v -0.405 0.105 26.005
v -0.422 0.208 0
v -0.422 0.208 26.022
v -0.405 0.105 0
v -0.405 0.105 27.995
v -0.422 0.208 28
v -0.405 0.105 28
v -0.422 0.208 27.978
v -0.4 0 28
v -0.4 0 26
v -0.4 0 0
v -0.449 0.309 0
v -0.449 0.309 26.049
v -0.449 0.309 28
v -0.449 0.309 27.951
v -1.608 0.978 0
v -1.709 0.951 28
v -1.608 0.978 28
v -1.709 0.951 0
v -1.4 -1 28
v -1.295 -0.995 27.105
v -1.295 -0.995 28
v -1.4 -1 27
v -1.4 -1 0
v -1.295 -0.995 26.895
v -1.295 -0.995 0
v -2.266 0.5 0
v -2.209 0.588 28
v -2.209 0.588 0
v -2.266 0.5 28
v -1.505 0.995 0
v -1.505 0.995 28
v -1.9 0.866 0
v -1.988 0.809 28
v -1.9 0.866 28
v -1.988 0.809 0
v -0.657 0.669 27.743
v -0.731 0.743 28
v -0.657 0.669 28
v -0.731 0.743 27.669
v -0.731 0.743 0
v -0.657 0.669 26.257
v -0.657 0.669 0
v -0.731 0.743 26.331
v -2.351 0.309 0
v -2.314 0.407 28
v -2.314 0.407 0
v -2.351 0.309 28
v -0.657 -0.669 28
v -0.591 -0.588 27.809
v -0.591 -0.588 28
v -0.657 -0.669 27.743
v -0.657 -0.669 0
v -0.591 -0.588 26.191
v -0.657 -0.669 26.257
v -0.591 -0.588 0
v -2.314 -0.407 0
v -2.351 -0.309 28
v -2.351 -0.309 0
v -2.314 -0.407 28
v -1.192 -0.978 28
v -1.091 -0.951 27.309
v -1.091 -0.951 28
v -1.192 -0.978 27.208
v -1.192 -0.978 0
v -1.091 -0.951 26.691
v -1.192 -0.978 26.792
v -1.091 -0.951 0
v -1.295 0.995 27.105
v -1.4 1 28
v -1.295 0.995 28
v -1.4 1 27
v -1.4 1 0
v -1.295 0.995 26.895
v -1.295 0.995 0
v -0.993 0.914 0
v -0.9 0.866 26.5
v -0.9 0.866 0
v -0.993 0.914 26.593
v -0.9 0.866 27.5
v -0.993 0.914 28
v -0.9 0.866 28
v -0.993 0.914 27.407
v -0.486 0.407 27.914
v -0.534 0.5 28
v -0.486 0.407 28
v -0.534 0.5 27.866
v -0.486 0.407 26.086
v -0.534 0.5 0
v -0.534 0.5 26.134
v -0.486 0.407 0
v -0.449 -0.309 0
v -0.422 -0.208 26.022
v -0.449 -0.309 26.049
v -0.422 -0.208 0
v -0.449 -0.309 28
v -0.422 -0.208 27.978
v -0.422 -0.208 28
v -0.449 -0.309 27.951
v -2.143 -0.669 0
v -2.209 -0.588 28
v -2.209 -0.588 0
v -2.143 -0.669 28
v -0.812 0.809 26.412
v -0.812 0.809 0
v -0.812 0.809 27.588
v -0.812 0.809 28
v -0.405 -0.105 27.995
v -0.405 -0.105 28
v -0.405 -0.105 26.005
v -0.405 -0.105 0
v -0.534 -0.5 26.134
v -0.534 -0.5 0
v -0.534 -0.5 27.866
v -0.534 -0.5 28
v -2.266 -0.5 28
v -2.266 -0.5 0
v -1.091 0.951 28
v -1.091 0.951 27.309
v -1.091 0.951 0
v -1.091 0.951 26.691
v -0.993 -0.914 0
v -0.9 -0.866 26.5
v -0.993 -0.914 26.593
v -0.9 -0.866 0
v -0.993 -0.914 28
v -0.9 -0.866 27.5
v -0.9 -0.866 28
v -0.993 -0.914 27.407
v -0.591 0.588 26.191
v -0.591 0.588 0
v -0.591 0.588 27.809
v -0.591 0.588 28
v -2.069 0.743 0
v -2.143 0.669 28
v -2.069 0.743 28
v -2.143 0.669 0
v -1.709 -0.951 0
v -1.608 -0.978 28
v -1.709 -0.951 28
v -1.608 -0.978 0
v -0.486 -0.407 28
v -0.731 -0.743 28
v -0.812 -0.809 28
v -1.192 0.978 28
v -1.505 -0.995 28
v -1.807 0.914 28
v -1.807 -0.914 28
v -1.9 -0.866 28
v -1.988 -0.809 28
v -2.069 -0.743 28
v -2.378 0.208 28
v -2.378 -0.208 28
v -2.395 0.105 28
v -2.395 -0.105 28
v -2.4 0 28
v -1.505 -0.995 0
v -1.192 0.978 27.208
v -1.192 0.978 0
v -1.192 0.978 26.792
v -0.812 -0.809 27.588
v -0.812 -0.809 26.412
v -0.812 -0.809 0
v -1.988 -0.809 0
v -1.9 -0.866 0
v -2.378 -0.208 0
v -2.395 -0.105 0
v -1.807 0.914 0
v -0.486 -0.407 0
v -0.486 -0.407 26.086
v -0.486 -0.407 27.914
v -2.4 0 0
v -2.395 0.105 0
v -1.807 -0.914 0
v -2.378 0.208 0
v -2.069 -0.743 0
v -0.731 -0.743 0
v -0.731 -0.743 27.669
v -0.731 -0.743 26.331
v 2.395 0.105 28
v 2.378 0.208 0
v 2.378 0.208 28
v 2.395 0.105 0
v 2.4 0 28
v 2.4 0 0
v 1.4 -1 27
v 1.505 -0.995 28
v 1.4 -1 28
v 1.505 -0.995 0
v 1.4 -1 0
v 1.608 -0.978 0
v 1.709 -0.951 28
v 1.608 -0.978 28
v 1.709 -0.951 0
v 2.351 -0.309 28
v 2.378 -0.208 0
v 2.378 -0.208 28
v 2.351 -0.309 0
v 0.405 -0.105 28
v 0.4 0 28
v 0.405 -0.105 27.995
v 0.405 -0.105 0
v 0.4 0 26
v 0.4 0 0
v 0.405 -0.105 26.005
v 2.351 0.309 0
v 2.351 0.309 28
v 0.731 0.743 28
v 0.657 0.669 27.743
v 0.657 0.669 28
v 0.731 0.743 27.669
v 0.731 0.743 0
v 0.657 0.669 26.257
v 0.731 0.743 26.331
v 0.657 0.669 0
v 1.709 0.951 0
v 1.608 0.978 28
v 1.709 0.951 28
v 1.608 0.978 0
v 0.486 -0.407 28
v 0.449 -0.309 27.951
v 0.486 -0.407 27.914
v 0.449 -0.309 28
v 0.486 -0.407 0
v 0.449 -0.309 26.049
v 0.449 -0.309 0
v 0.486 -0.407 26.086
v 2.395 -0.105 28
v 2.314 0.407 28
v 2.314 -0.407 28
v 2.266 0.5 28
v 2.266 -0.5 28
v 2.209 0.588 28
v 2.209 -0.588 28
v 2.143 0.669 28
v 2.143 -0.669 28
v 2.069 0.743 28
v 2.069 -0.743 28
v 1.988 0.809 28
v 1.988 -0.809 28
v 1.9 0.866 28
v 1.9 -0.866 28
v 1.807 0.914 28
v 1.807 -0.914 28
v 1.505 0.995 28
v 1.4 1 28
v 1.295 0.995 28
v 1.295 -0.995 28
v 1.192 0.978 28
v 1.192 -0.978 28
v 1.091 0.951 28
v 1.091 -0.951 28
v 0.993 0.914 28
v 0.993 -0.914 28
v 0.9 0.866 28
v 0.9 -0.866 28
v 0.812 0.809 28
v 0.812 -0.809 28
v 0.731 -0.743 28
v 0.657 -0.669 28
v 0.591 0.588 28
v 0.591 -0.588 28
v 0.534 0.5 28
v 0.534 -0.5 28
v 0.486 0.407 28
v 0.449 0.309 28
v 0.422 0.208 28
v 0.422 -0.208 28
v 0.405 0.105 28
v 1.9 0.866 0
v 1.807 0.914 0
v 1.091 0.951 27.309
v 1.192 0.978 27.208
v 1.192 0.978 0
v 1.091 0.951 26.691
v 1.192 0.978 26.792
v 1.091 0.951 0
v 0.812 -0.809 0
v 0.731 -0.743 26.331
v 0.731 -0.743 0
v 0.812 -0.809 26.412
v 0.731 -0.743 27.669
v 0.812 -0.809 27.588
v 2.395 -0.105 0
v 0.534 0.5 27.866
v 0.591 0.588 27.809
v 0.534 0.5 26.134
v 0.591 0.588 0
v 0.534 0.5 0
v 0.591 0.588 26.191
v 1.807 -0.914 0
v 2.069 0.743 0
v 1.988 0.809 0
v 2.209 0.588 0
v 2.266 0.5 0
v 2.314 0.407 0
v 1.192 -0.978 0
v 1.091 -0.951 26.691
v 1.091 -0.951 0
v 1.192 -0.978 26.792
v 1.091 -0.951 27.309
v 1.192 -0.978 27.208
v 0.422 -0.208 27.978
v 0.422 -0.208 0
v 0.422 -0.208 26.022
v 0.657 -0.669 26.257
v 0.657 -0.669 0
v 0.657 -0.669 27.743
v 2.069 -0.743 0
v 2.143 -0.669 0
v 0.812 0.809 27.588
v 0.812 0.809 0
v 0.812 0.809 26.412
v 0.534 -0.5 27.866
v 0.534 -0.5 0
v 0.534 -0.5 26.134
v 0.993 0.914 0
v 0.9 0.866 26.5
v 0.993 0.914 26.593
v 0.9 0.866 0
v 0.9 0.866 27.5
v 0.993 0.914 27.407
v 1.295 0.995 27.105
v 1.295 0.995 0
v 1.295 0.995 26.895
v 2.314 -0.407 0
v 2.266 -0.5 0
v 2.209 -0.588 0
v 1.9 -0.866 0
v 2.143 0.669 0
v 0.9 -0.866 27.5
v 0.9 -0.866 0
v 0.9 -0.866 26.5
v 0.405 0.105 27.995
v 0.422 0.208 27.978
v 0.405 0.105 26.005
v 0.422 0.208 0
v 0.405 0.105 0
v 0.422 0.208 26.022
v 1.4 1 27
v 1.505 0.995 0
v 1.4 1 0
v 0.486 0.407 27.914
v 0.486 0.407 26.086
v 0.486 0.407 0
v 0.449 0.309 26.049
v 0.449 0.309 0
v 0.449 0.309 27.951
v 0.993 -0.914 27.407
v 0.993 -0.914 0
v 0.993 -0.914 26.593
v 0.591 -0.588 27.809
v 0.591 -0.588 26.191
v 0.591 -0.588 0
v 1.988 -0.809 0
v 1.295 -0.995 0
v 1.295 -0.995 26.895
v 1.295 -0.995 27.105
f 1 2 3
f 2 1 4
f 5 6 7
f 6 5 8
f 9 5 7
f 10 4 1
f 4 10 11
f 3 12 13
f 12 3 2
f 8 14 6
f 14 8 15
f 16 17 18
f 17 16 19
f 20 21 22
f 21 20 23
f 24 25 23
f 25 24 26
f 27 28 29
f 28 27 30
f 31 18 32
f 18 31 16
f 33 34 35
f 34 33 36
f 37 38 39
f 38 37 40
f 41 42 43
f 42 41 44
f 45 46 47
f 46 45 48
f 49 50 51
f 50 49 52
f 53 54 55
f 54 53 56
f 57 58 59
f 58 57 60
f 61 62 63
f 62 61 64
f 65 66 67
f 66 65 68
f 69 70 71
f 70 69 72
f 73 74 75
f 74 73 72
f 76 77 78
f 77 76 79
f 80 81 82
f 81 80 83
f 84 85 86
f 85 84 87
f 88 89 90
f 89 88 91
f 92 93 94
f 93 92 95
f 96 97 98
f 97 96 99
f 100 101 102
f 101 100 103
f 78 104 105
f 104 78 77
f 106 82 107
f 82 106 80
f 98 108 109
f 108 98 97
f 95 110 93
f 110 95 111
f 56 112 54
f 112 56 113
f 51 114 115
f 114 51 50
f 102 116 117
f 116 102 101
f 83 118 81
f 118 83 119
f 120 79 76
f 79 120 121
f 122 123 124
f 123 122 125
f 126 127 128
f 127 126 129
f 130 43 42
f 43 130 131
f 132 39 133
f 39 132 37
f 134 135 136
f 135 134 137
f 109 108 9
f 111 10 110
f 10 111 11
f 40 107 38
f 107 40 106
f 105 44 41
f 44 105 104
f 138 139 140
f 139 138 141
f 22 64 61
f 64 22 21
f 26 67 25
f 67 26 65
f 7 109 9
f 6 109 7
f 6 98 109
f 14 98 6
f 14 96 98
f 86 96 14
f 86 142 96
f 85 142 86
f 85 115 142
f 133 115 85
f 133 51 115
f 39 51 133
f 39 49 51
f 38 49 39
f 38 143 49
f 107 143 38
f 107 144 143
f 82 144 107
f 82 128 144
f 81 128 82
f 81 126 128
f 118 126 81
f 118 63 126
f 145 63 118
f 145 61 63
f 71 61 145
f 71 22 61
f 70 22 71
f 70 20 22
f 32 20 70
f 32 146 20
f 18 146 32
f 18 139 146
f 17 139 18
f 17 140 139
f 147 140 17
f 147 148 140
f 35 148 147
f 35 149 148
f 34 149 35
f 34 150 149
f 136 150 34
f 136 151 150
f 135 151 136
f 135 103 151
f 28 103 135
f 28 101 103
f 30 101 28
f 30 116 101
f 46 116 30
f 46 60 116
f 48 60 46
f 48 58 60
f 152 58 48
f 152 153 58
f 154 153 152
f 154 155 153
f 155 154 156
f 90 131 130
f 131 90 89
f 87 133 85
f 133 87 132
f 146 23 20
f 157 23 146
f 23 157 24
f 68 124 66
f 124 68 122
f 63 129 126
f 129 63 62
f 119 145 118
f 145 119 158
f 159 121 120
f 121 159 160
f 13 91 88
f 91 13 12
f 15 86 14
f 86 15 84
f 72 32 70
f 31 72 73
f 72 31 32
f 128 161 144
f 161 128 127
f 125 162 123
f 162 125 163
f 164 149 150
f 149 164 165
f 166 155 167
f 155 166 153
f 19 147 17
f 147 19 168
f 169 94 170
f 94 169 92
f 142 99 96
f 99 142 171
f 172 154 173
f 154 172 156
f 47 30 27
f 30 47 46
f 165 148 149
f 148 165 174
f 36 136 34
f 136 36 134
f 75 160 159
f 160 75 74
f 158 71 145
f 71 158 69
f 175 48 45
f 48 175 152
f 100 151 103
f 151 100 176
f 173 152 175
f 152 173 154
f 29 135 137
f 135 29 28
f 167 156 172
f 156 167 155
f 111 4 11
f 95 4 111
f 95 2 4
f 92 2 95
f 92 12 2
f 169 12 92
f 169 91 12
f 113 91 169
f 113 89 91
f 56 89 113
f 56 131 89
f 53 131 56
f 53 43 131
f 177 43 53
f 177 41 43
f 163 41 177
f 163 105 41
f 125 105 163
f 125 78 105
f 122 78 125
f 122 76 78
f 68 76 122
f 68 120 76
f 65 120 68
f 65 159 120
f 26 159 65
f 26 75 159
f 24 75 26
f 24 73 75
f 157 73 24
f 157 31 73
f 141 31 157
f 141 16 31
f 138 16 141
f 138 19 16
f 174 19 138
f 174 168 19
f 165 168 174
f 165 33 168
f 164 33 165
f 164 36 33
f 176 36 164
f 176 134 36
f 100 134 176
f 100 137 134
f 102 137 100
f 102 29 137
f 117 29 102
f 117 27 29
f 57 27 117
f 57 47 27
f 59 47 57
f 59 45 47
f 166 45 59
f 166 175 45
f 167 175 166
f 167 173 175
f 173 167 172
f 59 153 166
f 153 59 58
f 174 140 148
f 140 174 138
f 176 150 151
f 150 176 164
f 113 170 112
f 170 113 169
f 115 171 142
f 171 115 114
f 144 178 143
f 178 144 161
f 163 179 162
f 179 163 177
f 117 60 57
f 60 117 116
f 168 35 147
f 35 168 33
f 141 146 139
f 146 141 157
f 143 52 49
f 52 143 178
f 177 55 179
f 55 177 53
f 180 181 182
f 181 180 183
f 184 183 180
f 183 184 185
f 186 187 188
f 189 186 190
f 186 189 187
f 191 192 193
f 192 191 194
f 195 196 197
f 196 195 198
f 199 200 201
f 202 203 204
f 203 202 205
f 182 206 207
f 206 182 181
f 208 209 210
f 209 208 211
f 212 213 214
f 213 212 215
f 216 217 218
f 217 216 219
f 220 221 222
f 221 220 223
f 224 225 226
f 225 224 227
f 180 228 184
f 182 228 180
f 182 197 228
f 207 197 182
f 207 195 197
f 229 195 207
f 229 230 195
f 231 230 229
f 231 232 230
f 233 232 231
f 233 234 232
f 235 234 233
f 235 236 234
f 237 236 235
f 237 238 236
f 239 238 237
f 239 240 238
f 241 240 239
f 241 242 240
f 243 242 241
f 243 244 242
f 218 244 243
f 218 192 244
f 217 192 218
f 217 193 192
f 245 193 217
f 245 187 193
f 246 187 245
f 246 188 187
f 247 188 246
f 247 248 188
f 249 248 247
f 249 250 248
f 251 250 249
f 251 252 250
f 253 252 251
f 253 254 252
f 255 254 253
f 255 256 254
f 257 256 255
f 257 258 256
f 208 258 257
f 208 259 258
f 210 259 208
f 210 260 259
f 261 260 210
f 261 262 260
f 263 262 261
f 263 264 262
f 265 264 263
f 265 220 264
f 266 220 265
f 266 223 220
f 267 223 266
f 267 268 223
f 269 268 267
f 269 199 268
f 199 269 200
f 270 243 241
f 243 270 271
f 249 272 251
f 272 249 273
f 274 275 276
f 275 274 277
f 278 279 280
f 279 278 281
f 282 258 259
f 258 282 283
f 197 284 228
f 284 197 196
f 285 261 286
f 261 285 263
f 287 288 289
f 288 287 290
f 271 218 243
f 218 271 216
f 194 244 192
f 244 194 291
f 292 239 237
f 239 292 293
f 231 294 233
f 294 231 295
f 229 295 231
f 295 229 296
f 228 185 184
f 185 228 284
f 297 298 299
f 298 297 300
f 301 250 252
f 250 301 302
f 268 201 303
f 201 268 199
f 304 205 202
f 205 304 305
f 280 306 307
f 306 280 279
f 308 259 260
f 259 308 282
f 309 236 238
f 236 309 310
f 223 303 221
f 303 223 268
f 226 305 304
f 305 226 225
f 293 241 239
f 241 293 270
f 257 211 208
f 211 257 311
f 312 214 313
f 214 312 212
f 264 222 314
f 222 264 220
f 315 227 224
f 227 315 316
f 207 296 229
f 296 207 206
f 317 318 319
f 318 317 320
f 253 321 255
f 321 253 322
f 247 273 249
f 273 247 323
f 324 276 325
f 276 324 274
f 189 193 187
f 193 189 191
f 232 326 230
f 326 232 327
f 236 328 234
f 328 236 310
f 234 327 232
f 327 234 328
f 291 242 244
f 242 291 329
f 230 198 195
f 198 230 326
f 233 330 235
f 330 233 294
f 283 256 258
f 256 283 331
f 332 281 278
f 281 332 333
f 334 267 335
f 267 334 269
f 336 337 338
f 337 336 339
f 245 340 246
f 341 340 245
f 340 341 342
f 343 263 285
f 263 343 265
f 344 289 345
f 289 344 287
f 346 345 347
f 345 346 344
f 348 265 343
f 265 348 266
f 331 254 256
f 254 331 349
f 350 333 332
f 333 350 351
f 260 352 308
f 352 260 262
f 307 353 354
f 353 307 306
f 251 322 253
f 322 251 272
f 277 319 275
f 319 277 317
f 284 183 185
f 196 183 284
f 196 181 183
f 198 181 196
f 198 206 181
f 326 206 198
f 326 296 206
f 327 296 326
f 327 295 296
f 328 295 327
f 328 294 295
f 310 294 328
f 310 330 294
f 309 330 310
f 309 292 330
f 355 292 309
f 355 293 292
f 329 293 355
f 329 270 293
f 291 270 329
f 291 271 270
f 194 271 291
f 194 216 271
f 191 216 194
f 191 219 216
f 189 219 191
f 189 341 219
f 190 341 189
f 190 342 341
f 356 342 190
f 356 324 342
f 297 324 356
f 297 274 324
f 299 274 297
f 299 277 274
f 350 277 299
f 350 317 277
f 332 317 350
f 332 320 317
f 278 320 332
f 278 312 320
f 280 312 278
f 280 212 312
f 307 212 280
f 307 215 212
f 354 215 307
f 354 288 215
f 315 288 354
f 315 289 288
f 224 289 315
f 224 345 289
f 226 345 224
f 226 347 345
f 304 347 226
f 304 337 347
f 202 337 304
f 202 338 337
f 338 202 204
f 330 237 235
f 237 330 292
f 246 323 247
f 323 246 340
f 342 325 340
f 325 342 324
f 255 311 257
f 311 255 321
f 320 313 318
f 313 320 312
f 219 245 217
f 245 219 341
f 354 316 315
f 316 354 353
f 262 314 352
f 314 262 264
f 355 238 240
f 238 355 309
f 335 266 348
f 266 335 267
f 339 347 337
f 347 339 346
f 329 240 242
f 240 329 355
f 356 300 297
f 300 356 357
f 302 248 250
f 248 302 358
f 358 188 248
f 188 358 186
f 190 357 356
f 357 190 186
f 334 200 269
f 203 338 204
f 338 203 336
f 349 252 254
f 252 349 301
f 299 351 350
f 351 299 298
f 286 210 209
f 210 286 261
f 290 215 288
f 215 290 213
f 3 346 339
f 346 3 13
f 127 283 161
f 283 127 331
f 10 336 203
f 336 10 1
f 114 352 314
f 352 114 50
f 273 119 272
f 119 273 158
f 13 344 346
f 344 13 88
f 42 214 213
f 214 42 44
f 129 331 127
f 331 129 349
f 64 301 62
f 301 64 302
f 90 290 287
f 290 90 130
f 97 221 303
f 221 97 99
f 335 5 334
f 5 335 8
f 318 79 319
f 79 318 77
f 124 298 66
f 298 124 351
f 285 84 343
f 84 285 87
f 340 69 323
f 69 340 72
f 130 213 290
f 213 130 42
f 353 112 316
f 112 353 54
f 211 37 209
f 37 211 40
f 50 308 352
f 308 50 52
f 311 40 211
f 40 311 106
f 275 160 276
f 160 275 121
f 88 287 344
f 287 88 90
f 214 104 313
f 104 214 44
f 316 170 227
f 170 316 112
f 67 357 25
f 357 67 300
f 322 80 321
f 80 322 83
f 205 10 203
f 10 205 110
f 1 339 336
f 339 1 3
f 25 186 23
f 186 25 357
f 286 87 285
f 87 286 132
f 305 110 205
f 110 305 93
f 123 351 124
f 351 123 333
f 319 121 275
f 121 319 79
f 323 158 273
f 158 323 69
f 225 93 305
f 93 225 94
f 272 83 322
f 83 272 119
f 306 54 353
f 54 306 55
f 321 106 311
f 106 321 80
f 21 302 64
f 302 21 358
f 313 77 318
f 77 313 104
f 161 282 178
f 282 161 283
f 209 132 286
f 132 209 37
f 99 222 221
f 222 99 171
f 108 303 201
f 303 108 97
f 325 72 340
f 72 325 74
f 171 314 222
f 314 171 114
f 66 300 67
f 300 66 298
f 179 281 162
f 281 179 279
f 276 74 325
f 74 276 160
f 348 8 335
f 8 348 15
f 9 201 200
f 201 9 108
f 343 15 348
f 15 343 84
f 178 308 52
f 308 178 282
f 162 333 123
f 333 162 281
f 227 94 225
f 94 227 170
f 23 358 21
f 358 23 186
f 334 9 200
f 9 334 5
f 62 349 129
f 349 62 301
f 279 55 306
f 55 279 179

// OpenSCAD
// Two-prong cotter pin.
$fn = 60;
eps = 0.02;
wire_d = 2;
length = 28;
prong_gap = wire_d*1.4;
union() {
    translate([-prong_gap/2,0,0]) cylinder(d=wire_d,h=length);
    translate([prong_gap/2,0,0]) cylinder(d=wire_d,h=length);
    translate([-prong_gap/2,0,length-wire_d/2]) rotate([0,90,0]) cylinder(d=wire_d,h=prong_gap);
}
